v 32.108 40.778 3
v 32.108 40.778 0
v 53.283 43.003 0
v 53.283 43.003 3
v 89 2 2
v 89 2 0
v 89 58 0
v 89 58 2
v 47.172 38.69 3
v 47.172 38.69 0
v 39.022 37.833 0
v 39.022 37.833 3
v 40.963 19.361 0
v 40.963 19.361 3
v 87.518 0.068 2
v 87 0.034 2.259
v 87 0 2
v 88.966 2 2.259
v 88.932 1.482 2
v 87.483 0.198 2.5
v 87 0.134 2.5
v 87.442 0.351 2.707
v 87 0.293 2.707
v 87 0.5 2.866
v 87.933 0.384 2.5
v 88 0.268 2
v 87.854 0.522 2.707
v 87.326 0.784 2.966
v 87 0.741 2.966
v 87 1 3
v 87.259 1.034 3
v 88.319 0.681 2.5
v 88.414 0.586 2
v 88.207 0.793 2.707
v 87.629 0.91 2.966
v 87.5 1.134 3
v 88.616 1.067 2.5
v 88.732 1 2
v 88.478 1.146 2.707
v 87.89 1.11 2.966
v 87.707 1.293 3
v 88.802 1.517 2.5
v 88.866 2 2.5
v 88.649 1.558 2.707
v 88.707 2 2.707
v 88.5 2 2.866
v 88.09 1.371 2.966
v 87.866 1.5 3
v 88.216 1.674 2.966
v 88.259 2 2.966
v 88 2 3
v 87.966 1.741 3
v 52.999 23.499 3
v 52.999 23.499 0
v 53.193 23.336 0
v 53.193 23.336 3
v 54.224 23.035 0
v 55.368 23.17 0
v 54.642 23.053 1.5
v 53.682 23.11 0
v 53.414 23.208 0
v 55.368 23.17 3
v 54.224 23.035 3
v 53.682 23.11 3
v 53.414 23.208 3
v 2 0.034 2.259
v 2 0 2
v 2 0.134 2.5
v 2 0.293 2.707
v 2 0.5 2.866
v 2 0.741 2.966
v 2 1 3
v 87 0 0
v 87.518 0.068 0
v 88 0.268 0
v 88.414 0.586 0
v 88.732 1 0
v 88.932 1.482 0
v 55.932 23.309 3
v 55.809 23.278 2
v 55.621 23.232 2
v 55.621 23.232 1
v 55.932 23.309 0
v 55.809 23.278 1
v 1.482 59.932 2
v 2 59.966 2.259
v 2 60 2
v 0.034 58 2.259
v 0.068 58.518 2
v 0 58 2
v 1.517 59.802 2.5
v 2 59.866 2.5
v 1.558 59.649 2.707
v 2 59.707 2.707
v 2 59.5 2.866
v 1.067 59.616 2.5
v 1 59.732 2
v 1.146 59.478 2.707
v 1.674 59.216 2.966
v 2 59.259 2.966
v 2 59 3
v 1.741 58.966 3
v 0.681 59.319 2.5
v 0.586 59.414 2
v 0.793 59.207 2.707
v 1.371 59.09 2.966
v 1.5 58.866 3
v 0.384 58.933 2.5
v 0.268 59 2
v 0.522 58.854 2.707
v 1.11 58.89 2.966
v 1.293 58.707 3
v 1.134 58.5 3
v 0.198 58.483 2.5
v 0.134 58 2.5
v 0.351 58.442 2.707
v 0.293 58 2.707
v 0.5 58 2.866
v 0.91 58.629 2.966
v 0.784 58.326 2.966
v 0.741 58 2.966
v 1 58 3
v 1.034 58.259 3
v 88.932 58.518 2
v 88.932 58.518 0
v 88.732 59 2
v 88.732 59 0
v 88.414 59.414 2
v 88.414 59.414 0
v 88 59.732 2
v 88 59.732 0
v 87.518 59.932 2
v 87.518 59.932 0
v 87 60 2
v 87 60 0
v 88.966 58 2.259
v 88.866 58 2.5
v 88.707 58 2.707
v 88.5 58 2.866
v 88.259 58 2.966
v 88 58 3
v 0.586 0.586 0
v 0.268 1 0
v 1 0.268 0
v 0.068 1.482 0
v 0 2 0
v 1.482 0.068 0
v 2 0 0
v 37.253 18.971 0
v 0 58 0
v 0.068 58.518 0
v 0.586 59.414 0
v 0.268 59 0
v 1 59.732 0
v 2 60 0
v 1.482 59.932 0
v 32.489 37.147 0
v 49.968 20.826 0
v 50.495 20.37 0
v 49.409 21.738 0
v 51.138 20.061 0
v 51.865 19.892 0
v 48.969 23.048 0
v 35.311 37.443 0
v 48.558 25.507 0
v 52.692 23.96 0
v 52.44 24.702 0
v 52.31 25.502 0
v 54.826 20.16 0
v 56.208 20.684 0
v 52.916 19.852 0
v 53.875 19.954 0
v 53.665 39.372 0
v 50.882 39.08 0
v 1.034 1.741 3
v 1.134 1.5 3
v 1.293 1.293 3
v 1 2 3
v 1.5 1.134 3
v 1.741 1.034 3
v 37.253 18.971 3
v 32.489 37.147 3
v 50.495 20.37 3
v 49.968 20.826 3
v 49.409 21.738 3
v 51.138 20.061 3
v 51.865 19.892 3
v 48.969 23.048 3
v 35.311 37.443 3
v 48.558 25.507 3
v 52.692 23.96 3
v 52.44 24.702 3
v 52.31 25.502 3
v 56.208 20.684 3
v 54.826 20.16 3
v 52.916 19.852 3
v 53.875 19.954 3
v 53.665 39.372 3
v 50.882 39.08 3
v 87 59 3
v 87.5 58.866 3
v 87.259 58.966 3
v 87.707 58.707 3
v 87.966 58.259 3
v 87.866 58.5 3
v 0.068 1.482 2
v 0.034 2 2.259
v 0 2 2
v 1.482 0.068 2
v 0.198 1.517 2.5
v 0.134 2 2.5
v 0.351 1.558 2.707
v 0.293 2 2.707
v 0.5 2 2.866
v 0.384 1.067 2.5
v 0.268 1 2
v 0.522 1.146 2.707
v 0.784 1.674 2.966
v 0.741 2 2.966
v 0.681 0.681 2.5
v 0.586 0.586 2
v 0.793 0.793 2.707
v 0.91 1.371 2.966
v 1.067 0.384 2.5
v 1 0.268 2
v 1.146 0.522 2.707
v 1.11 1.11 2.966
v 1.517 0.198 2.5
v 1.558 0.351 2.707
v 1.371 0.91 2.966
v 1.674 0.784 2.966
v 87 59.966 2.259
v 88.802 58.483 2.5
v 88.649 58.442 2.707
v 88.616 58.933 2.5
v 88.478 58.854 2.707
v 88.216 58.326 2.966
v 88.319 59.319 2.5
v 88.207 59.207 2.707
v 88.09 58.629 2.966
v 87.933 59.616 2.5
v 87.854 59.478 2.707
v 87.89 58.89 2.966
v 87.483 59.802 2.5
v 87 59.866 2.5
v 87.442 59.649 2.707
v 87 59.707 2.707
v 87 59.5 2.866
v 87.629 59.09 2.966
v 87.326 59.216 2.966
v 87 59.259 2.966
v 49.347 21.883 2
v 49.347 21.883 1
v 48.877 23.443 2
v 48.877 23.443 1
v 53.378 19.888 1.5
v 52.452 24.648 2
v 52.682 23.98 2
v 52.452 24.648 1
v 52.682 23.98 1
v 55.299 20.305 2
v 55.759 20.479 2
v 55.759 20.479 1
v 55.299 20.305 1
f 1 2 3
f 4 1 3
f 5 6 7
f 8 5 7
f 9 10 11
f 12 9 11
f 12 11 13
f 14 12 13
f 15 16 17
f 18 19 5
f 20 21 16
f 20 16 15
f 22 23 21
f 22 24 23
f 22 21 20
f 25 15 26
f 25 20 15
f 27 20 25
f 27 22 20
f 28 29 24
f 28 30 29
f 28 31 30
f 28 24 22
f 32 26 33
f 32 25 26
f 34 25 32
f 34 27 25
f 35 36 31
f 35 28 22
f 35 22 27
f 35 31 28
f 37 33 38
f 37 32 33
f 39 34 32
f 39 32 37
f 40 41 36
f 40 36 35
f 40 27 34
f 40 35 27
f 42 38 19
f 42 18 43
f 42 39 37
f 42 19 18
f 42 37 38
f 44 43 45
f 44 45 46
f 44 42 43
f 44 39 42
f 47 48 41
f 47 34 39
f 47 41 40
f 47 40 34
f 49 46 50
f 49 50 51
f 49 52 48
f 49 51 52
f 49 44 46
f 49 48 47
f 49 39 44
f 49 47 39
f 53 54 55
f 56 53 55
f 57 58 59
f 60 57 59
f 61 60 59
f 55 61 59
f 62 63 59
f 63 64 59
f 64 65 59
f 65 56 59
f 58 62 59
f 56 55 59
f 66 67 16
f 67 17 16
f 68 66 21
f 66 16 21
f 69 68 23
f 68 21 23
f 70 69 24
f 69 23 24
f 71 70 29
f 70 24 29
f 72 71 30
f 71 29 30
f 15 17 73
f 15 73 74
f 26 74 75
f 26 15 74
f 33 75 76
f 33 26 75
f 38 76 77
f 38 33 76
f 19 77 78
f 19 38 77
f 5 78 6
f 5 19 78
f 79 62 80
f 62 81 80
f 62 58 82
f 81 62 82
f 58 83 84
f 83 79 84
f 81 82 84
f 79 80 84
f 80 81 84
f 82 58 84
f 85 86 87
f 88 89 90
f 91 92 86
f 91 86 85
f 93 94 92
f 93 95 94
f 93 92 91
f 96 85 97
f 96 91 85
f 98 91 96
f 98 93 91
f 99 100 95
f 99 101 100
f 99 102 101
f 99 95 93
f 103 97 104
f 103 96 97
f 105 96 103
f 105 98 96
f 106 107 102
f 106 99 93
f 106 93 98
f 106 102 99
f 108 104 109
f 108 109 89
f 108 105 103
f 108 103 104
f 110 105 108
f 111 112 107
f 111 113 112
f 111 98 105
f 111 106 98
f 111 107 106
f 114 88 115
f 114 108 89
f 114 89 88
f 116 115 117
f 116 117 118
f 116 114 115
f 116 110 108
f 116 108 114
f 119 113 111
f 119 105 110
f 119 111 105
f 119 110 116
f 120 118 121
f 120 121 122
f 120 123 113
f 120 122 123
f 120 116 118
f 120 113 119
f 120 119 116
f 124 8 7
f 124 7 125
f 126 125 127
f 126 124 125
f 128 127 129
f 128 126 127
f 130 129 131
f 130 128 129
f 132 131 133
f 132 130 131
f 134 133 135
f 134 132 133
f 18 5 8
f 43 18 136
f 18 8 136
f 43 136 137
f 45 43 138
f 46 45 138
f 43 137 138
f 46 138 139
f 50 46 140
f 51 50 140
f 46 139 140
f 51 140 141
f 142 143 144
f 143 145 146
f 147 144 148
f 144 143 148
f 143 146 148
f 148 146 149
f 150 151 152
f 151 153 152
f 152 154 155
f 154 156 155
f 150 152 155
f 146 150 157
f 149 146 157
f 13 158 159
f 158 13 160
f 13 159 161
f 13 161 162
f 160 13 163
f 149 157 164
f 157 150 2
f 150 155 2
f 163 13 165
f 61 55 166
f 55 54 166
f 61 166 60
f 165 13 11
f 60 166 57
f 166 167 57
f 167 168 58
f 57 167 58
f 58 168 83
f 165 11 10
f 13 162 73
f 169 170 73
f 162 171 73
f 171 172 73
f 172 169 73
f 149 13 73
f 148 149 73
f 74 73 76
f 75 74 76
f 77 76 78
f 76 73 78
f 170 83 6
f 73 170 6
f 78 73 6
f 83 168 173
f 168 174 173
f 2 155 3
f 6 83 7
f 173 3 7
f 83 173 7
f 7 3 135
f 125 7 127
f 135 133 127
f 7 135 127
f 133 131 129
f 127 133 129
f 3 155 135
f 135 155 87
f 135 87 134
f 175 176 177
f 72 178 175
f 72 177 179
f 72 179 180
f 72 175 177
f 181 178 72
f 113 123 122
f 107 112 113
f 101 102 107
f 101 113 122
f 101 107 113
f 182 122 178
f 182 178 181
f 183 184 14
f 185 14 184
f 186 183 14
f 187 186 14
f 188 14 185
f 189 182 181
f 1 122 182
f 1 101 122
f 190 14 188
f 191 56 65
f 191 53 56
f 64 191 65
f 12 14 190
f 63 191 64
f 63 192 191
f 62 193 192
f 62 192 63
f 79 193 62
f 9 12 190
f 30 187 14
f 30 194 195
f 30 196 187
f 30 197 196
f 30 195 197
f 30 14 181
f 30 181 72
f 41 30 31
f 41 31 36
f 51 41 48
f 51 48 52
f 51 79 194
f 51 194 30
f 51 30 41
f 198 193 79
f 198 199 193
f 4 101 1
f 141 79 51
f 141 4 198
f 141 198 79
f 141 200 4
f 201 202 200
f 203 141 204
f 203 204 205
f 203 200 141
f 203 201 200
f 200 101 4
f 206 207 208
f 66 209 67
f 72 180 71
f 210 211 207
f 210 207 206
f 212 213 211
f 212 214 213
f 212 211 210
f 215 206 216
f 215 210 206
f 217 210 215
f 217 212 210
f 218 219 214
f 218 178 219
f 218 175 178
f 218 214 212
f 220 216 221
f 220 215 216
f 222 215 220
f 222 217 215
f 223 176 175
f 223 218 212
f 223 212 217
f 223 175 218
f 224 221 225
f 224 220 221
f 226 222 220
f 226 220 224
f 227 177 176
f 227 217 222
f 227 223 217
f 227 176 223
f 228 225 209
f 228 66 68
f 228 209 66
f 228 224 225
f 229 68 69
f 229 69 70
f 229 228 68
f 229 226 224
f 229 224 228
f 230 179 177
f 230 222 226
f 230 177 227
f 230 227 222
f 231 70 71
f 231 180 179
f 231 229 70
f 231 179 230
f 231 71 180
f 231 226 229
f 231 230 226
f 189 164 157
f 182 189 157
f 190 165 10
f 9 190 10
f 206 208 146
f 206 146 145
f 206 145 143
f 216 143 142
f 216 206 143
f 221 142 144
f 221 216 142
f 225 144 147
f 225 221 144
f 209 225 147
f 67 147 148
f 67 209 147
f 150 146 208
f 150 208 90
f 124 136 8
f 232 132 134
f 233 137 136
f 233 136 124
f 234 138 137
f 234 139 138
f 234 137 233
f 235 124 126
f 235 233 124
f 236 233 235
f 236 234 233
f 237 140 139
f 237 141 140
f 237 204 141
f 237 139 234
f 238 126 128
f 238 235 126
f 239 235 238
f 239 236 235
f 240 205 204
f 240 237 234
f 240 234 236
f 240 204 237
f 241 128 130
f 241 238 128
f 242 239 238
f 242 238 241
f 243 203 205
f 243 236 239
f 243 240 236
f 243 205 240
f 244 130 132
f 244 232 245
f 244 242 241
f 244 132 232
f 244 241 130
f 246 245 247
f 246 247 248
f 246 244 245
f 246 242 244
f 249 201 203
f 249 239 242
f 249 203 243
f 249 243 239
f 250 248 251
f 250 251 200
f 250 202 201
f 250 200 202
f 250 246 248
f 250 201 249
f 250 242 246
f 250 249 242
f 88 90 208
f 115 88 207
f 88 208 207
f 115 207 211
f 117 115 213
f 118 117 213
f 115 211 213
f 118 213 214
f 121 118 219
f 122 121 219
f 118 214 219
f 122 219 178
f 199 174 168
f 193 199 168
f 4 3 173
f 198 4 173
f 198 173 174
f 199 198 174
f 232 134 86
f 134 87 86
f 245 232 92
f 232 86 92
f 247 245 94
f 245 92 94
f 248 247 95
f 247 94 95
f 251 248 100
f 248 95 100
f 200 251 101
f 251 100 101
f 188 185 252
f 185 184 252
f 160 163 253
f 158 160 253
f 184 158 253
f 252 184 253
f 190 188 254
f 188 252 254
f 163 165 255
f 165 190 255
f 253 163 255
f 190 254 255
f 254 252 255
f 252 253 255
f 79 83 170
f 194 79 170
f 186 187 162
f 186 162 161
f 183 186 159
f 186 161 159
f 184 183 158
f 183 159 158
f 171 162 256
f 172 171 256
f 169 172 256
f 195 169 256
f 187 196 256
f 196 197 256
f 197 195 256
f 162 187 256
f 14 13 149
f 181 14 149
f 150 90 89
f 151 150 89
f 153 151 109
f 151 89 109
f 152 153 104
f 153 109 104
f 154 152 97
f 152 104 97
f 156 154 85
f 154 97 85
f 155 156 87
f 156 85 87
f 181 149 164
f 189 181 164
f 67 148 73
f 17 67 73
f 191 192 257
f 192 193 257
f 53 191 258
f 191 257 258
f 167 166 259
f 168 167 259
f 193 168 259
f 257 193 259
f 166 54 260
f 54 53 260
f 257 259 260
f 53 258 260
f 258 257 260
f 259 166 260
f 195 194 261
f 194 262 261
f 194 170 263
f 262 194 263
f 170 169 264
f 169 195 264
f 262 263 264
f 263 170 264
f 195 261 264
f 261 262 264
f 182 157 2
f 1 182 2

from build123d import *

# Parameters (mm, degrees)
EXTRUDE_DEPTH           = 10
EXTRUDE_PLACEMENT_ANGLE = 6.000002
BOX_W                   = 89
BOX_H                   = 60
BOX_DEPTH               = 3
FILLET_R                = 2
FILLET001_R             = 1


with BuildPart() as extrude_body:
    # path3028 → Extrude (new body)
    with BuildSketch(Plane(origin=(15.82339, -281.713038, 0), x_dir=(0, -1, 0), z_dir=(0, 0, -1))):
        with BuildLine():
            add(Edge.make_bspline(
                [(-11.499453, 10.933906), (-11.499453, -10.358437)],
                knots=[0, 0, 75.445312, 75.445312], degree=1))
            add(Edge.make_bspline(
                [(-11.499453, -10.358437), (-7.848203, -10.358437)],
                knots=[0, 0, 12.9375, 12.9375], degree=1))
            add(Edge.make_bspline(
                [(-7.848203, -10.358437), (-7.848203, -7.560469)],
                knots=[0, 0, 9.914062, 9.914062], degree=1))
            add(Edge.make_bspline(
                [(-7.848203, -7.560469), (5.804294, -7.560469)],
                knots=[0, 0, 48.37499, 48.37499], degree=1))
            add(Edge.make_bspline(
                [(5.804294, -7.560469), (6.756794, -7.560449), (7.44471, -7.719198), (7.868044, -8.036719)],
                knots=[0, 0, 0, 0, 1, 1, 1, 1], degree=3))
            add(Edge.make_bspline(
                [(7.868044, -8.036719), (8.278141, -8.367427), (8.483203, -8.896593), (8.483203, -9.624219)],
                knots=[0, 0, 0, 0, 1, 1, 1, 1], degree=3))
            add(Edge.make_bspline(
                [(8.483203, -9.624219), (8.483203, -9.822634), (8.469939, -10.067373), (8.443523, -10.358437)],
                knots=[0, 0, 0, 0, 1, 1, 1, 1], degree=3))
            add(Edge.make_bspline(
                [(8.443523, -10.358437), (8.403843, -10.649456), (8.37737, -10.841279), (8.364134, -10.933906)],
                knots=[0, 0, 0, 0, 1, 1, 1, 1], degree=3))
            add(Edge.make_bspline(
                [(8.364134, -10.933906), (11.003363, -10.933906)],
                knots=[0, 0, 9.3516, 9.3516], degree=1))
            add(Edge.make_bspline(
                [(11.003363, -10.933906), (11.175349, -10.470863), (11.301023, -9.994613), (11.380384, -9.505156)],
                knots=[0, 0, 0, 0, 1, 1, 1, 1], degree=3))
            add(Edge.make_bspline(
                [(11.380384, -9.505156), (11.459773, -9.015656), (11.499453, -8.526177), (11.499453, -8.036719)],
                knots=[0, 0, 0, 0, 1, 1, 1, 1], degree=3))
            add(Edge.make_bspline(
                [(11.499453, -8.036719), (11.499453, -6.4492), (11.069516, -5.35118), (10.209613, -4.742656)],
                knots=[0, 0, 0, 0, 1, 1, 1, 1], degree=3))
            add(Edge.make_bspline(
                [(10.209613, -4.742656), (9.336474, -4.134098), (7.735766, -3.829827), (5.407433, -3.829844)],
                knots=[0, 0, 0, 0, 1, 1, 1, 1], degree=3))
            add(Edge.make_bspline(
                [(5.407433, -3.829844), (-7.848203, -3.829844)],
                knots=[0, 0, 46.96879, 46.96879], degree=1))
            add(Edge.make_bspline(
                [(-7.848203, -3.829844), (-7.848203, 4.365625)],
                knots=[0, 0, 29.039063, 29.039063], degree=1))
            add(Edge.make_bspline(
                [(-7.848203, 4.365625), (10.725544, 4.365625)],
                knots=[0, 0, 65.81249, 65.81249], degree=1))
            add(Edge.make_bspline(
                [(10.725544, 4.365625), (10.725544, 8.09625)],
                knots=[0, 0, 13.21875, 13.21875], degree=1))
            add(Edge.make_bspline(
                [(10.725544, 8.09625), (-7.848203, 8.09625)],
                knots=[0, 0, 65.81249, 65.81249], degree=1))
            add(Edge.make_bspline(
                [(-7.848203, 8.09625), (-7.848203, 10.933906)],
                knots=[0, 0, 10.054687, 10.054687], degree=1))
            add(Edge.make_bspline(
                [(-7.848203, 10.933906), (-11.499453, 10.933906)],
                knots=[0, 0, 12.9375, 12.9375], degree=1))
        make_face()
    extrude(amount=-EXTRUDE_DEPTH)


with BuildPart() as extrude_body_1:
    # Extrude placement: moved
    add(extrude_body.part.moved(Location((-1, 309, -1))).rotate(Axis((-1, 309, -1), (0, 0, 1)), EXTRUDE_PLACEMENT_ANGLE))


with BuildPart() as fillet001:
    # Box → Box (new body)
    with BuildSketch(Plane.XY):
        with Locations((44.5, 30)):
            Rectangle(BOX_W, BOX_H)
    extrude(amount=BOX_DEPTH)

    # Fillet
    fillet_edges = [fillet001.edges().sort_by_distance(p)[0] for p in [
        (0, 0, 1.5),
        (0, 60, 1.5),
        (89, 0, 1.5),
        (89, 60, 1.5),
    ]]
    fillet(fillet_edges, radius=FILLET_R)

    # Cut: cut Extrude body
    add(extrude_body_1.part, mode=Mode.SUBTRACT)

    # Fillet001
    fillet001_edges = [fillet001.edges().sort_by_distance(p)[0] for p in [
        (0.585786, 0.585786, 3),
        (44.5, 0, 3),
        (0, 30, 3),
        (88.414214, 0.585786, 3),
        (89, 30, 3),
        (88.414214, 59.414214, 3),
        (44.5, 60, 3),
        (0.585786, 59.414214, 3),
    ]]
    fillet(fillet001_edges, radius=FILLET001_R)


solid = fillet001.part
